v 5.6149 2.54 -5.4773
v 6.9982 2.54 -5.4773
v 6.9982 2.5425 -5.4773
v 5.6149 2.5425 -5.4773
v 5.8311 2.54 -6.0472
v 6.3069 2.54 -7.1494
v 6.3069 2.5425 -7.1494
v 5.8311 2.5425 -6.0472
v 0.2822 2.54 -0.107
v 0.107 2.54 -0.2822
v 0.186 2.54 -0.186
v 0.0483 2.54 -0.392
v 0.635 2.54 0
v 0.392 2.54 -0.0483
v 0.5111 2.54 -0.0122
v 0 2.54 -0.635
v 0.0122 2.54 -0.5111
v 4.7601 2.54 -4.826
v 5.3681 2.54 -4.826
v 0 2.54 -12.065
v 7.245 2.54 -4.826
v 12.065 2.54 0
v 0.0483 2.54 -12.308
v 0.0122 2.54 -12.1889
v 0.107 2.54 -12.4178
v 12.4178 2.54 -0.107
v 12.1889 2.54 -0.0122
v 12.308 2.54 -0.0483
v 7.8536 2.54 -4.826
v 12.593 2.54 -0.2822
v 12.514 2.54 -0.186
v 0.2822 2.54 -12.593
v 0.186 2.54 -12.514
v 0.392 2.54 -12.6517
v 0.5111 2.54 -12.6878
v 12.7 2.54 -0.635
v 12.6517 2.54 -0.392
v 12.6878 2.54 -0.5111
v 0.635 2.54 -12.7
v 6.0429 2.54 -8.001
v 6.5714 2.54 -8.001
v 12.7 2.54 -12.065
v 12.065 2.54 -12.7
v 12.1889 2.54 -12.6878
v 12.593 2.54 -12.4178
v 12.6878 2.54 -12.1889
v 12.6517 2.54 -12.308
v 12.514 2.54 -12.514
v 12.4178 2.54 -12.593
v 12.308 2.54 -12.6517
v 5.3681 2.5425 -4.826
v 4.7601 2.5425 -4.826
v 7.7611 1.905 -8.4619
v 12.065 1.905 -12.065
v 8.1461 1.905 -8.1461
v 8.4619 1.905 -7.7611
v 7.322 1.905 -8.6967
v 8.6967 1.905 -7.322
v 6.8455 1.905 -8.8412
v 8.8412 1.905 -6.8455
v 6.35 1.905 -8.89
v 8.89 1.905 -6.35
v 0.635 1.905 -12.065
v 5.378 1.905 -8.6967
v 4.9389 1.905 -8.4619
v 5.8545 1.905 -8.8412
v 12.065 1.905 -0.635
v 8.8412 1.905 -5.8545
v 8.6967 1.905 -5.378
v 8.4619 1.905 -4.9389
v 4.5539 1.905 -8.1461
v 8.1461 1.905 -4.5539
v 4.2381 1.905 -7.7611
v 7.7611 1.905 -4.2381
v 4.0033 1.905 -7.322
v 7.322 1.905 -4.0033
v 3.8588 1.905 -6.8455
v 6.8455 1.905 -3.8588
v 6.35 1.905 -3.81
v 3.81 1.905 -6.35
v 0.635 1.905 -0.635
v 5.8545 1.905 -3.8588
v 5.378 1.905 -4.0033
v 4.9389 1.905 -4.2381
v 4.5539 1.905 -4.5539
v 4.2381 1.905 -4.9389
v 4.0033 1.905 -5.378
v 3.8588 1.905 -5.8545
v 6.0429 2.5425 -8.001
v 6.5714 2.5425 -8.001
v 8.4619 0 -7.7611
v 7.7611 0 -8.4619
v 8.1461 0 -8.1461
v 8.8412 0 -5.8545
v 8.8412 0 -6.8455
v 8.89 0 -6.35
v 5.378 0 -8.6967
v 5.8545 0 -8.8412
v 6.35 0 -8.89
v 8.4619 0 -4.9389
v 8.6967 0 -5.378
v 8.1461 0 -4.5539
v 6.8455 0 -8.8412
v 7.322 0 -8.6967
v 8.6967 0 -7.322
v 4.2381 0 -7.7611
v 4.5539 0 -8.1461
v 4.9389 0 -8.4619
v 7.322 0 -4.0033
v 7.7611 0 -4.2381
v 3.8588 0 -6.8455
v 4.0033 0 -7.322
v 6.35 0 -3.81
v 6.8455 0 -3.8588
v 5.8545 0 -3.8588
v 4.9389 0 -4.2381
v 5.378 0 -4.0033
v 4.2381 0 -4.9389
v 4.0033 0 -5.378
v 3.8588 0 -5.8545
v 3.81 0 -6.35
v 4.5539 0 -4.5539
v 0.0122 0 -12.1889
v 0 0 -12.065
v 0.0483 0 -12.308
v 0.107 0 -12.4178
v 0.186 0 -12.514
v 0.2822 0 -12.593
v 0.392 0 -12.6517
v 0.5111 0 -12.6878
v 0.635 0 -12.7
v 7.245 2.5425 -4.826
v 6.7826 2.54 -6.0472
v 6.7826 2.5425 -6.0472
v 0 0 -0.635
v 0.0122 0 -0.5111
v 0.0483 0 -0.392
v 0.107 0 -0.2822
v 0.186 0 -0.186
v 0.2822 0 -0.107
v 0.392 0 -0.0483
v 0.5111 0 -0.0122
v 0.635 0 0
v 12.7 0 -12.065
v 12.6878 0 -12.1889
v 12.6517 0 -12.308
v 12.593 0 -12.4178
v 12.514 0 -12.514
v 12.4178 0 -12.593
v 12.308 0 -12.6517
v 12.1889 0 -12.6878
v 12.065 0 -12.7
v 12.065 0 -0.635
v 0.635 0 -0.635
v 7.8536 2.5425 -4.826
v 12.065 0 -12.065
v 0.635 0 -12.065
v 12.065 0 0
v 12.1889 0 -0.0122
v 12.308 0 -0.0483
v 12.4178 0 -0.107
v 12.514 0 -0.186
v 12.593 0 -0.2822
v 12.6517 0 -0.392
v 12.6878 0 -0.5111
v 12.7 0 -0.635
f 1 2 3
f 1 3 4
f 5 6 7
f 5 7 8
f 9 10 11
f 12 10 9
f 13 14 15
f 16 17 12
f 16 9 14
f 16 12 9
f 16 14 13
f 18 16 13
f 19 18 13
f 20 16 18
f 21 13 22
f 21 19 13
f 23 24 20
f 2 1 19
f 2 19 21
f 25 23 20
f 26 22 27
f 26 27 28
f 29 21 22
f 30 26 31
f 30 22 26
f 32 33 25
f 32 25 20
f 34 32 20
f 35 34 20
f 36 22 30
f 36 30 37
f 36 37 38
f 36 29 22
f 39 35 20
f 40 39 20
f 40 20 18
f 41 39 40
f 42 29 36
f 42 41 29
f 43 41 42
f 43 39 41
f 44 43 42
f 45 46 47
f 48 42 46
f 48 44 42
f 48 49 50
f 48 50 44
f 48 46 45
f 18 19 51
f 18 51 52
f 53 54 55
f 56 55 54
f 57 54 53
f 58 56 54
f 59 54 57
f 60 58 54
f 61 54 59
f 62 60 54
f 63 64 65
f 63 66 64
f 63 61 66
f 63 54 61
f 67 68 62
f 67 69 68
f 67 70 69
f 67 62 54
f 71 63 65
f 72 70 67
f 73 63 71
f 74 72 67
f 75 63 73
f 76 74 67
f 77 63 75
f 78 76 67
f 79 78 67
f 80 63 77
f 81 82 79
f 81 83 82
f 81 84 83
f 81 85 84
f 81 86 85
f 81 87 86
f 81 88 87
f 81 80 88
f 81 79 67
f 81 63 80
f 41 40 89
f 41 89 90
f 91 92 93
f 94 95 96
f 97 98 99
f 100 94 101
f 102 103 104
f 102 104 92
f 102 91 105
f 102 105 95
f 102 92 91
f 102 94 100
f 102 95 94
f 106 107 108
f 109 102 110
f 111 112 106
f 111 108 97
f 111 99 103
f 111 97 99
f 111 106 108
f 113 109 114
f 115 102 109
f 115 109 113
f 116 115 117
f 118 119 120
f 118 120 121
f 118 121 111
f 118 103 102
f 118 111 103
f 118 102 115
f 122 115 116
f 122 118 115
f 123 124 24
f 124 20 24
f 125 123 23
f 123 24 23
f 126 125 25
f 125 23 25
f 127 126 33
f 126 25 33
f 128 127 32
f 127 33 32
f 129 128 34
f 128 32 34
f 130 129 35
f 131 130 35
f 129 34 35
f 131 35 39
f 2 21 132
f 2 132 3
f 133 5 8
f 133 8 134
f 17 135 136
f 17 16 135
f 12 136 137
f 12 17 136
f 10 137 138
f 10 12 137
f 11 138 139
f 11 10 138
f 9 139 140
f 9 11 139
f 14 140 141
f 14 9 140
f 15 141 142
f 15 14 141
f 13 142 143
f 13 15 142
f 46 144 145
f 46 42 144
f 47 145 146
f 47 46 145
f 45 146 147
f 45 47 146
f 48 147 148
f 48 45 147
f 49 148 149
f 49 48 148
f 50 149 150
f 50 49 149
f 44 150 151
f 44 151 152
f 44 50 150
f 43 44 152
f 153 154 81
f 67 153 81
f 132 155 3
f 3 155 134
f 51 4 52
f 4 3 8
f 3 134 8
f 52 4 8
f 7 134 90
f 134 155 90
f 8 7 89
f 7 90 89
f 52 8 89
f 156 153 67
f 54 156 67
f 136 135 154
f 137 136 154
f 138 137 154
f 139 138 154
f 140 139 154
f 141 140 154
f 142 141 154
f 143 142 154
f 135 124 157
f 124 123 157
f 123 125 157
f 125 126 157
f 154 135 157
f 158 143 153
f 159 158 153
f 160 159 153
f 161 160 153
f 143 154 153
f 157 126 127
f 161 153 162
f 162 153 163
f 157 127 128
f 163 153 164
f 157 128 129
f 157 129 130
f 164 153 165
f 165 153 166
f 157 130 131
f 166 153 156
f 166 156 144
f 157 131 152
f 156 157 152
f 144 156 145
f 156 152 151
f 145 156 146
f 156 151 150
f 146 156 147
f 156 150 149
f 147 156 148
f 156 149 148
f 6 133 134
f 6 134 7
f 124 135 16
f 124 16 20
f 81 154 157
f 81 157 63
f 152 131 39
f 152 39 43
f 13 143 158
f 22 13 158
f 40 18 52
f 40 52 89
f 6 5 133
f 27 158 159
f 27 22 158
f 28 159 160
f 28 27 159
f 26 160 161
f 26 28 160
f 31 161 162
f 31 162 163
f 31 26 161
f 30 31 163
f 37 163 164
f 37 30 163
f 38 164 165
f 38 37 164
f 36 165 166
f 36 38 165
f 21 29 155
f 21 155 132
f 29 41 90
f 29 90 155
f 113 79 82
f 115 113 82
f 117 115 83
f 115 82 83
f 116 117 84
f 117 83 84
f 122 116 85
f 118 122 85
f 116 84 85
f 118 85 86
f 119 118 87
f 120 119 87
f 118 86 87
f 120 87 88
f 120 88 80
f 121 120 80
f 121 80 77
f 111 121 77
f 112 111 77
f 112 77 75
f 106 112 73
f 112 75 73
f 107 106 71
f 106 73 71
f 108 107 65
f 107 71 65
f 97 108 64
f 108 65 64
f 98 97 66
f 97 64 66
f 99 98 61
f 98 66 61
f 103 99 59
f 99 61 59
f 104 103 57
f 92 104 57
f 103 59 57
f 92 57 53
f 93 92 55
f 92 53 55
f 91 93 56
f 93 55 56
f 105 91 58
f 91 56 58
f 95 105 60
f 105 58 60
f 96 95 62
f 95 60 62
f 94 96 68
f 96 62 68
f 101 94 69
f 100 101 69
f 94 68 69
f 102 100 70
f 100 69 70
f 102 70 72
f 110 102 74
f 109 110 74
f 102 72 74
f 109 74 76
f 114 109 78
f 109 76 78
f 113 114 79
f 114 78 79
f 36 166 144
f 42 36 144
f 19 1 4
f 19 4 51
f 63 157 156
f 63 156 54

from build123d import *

# Parameters (mm, degrees)
SKETCH1_W           = 12.7
SKETCH1_H           = 12.7
BOSS_EXTRUDE1_DEPTH = 2.54
FILLET1_R           = 0.635
SHELL1_START        = 0.635
SHELL1_OUTLINE_W    = 1.905
SHELL1_OUTLINE_H    = 11.43
SHELL1_DEPTH        = 11.43
SKETCH2_R           = 2.54
BOSS_EXTRUDE2_DEPTH = 1.905
BOSS_EXTRUDE3_DEPTH = 0.00254


# Read off the part's stored shape, not the designer's step: Shell1
with BuildPart() as part:
    # Sketch1 → Boss-Extrude1 (new body)
    with BuildSketch(Plane(origin=(0, 0, 0), x_dir=(1, 0, 0), z_dir=(0, 1, 0))):
        with Locations((6.35, 6.35)):
            Rectangle(SKETCH1_W, SKETCH1_H)
    extrude(amount=BOSS_EXTRUDE1_DEPTH)

    # Fillet1
    fillet1_edges = [part.edges().sort_by_distance(p)[0] for p in [
        (0, 1.27, -12.7),
        (12.7, 1.27, -12.7),
        (12.7, 1.27, 0),
        (0, 1.27, 0),
    ]]
    fillet(fillet1_edges, radius=FILLET1_R)

    # Shell1 outline → Shell1 (cut)
    with BuildSketch(Plane.YZ.offset(SHELL1_START)):
        with Locations((0.9525, -6.35)):
            Rectangle(SHELL1_OUTLINE_W, SHELL1_OUTLINE_H)
    extrude(amount=SHELL1_DEPTH, mode=Mode.SUBTRACT)

    # Sketch2 → Boss-Extrude2 (add)
    with BuildSketch(Plane(origin=(0, 1.905, 0), x_dir=(-1, 0, 0), z_dir=(0, -1, 0))):
        with Locations(Location((-6.35, 6.35, 0), (0, 0, 270))):
            Circle(SKETCH2_R)
    extrude(amount=BOSS_EXTRUDE2_DEPTH)

    # Sketch3 → Boss-Extrude3 (add)
    with BuildSketch(Plane(origin=(0, 2.54, 0), x_dir=(1, 0, 0), z_dir=(0, 1, 0))):
        Polygon((6.042905248, 8.001), (6.571435897, 8.001), (7.853647436, 4.826), (7.244978566, 4.826), (6.998203726, 5.477282051), (5.614865385, 5.477282051), (5.368090545, 4.826), (4.760057692, 4.826), align=None)
        Polygon((6.306852564, 7.149372396), (5.831111378, 6.047153846), (6.78259375, 6.047153846), align=None, mode=Mode.SUBTRACT)
    extrude(amount=BOSS_EXTRUDE3_DEPTH)


solid = part.part
